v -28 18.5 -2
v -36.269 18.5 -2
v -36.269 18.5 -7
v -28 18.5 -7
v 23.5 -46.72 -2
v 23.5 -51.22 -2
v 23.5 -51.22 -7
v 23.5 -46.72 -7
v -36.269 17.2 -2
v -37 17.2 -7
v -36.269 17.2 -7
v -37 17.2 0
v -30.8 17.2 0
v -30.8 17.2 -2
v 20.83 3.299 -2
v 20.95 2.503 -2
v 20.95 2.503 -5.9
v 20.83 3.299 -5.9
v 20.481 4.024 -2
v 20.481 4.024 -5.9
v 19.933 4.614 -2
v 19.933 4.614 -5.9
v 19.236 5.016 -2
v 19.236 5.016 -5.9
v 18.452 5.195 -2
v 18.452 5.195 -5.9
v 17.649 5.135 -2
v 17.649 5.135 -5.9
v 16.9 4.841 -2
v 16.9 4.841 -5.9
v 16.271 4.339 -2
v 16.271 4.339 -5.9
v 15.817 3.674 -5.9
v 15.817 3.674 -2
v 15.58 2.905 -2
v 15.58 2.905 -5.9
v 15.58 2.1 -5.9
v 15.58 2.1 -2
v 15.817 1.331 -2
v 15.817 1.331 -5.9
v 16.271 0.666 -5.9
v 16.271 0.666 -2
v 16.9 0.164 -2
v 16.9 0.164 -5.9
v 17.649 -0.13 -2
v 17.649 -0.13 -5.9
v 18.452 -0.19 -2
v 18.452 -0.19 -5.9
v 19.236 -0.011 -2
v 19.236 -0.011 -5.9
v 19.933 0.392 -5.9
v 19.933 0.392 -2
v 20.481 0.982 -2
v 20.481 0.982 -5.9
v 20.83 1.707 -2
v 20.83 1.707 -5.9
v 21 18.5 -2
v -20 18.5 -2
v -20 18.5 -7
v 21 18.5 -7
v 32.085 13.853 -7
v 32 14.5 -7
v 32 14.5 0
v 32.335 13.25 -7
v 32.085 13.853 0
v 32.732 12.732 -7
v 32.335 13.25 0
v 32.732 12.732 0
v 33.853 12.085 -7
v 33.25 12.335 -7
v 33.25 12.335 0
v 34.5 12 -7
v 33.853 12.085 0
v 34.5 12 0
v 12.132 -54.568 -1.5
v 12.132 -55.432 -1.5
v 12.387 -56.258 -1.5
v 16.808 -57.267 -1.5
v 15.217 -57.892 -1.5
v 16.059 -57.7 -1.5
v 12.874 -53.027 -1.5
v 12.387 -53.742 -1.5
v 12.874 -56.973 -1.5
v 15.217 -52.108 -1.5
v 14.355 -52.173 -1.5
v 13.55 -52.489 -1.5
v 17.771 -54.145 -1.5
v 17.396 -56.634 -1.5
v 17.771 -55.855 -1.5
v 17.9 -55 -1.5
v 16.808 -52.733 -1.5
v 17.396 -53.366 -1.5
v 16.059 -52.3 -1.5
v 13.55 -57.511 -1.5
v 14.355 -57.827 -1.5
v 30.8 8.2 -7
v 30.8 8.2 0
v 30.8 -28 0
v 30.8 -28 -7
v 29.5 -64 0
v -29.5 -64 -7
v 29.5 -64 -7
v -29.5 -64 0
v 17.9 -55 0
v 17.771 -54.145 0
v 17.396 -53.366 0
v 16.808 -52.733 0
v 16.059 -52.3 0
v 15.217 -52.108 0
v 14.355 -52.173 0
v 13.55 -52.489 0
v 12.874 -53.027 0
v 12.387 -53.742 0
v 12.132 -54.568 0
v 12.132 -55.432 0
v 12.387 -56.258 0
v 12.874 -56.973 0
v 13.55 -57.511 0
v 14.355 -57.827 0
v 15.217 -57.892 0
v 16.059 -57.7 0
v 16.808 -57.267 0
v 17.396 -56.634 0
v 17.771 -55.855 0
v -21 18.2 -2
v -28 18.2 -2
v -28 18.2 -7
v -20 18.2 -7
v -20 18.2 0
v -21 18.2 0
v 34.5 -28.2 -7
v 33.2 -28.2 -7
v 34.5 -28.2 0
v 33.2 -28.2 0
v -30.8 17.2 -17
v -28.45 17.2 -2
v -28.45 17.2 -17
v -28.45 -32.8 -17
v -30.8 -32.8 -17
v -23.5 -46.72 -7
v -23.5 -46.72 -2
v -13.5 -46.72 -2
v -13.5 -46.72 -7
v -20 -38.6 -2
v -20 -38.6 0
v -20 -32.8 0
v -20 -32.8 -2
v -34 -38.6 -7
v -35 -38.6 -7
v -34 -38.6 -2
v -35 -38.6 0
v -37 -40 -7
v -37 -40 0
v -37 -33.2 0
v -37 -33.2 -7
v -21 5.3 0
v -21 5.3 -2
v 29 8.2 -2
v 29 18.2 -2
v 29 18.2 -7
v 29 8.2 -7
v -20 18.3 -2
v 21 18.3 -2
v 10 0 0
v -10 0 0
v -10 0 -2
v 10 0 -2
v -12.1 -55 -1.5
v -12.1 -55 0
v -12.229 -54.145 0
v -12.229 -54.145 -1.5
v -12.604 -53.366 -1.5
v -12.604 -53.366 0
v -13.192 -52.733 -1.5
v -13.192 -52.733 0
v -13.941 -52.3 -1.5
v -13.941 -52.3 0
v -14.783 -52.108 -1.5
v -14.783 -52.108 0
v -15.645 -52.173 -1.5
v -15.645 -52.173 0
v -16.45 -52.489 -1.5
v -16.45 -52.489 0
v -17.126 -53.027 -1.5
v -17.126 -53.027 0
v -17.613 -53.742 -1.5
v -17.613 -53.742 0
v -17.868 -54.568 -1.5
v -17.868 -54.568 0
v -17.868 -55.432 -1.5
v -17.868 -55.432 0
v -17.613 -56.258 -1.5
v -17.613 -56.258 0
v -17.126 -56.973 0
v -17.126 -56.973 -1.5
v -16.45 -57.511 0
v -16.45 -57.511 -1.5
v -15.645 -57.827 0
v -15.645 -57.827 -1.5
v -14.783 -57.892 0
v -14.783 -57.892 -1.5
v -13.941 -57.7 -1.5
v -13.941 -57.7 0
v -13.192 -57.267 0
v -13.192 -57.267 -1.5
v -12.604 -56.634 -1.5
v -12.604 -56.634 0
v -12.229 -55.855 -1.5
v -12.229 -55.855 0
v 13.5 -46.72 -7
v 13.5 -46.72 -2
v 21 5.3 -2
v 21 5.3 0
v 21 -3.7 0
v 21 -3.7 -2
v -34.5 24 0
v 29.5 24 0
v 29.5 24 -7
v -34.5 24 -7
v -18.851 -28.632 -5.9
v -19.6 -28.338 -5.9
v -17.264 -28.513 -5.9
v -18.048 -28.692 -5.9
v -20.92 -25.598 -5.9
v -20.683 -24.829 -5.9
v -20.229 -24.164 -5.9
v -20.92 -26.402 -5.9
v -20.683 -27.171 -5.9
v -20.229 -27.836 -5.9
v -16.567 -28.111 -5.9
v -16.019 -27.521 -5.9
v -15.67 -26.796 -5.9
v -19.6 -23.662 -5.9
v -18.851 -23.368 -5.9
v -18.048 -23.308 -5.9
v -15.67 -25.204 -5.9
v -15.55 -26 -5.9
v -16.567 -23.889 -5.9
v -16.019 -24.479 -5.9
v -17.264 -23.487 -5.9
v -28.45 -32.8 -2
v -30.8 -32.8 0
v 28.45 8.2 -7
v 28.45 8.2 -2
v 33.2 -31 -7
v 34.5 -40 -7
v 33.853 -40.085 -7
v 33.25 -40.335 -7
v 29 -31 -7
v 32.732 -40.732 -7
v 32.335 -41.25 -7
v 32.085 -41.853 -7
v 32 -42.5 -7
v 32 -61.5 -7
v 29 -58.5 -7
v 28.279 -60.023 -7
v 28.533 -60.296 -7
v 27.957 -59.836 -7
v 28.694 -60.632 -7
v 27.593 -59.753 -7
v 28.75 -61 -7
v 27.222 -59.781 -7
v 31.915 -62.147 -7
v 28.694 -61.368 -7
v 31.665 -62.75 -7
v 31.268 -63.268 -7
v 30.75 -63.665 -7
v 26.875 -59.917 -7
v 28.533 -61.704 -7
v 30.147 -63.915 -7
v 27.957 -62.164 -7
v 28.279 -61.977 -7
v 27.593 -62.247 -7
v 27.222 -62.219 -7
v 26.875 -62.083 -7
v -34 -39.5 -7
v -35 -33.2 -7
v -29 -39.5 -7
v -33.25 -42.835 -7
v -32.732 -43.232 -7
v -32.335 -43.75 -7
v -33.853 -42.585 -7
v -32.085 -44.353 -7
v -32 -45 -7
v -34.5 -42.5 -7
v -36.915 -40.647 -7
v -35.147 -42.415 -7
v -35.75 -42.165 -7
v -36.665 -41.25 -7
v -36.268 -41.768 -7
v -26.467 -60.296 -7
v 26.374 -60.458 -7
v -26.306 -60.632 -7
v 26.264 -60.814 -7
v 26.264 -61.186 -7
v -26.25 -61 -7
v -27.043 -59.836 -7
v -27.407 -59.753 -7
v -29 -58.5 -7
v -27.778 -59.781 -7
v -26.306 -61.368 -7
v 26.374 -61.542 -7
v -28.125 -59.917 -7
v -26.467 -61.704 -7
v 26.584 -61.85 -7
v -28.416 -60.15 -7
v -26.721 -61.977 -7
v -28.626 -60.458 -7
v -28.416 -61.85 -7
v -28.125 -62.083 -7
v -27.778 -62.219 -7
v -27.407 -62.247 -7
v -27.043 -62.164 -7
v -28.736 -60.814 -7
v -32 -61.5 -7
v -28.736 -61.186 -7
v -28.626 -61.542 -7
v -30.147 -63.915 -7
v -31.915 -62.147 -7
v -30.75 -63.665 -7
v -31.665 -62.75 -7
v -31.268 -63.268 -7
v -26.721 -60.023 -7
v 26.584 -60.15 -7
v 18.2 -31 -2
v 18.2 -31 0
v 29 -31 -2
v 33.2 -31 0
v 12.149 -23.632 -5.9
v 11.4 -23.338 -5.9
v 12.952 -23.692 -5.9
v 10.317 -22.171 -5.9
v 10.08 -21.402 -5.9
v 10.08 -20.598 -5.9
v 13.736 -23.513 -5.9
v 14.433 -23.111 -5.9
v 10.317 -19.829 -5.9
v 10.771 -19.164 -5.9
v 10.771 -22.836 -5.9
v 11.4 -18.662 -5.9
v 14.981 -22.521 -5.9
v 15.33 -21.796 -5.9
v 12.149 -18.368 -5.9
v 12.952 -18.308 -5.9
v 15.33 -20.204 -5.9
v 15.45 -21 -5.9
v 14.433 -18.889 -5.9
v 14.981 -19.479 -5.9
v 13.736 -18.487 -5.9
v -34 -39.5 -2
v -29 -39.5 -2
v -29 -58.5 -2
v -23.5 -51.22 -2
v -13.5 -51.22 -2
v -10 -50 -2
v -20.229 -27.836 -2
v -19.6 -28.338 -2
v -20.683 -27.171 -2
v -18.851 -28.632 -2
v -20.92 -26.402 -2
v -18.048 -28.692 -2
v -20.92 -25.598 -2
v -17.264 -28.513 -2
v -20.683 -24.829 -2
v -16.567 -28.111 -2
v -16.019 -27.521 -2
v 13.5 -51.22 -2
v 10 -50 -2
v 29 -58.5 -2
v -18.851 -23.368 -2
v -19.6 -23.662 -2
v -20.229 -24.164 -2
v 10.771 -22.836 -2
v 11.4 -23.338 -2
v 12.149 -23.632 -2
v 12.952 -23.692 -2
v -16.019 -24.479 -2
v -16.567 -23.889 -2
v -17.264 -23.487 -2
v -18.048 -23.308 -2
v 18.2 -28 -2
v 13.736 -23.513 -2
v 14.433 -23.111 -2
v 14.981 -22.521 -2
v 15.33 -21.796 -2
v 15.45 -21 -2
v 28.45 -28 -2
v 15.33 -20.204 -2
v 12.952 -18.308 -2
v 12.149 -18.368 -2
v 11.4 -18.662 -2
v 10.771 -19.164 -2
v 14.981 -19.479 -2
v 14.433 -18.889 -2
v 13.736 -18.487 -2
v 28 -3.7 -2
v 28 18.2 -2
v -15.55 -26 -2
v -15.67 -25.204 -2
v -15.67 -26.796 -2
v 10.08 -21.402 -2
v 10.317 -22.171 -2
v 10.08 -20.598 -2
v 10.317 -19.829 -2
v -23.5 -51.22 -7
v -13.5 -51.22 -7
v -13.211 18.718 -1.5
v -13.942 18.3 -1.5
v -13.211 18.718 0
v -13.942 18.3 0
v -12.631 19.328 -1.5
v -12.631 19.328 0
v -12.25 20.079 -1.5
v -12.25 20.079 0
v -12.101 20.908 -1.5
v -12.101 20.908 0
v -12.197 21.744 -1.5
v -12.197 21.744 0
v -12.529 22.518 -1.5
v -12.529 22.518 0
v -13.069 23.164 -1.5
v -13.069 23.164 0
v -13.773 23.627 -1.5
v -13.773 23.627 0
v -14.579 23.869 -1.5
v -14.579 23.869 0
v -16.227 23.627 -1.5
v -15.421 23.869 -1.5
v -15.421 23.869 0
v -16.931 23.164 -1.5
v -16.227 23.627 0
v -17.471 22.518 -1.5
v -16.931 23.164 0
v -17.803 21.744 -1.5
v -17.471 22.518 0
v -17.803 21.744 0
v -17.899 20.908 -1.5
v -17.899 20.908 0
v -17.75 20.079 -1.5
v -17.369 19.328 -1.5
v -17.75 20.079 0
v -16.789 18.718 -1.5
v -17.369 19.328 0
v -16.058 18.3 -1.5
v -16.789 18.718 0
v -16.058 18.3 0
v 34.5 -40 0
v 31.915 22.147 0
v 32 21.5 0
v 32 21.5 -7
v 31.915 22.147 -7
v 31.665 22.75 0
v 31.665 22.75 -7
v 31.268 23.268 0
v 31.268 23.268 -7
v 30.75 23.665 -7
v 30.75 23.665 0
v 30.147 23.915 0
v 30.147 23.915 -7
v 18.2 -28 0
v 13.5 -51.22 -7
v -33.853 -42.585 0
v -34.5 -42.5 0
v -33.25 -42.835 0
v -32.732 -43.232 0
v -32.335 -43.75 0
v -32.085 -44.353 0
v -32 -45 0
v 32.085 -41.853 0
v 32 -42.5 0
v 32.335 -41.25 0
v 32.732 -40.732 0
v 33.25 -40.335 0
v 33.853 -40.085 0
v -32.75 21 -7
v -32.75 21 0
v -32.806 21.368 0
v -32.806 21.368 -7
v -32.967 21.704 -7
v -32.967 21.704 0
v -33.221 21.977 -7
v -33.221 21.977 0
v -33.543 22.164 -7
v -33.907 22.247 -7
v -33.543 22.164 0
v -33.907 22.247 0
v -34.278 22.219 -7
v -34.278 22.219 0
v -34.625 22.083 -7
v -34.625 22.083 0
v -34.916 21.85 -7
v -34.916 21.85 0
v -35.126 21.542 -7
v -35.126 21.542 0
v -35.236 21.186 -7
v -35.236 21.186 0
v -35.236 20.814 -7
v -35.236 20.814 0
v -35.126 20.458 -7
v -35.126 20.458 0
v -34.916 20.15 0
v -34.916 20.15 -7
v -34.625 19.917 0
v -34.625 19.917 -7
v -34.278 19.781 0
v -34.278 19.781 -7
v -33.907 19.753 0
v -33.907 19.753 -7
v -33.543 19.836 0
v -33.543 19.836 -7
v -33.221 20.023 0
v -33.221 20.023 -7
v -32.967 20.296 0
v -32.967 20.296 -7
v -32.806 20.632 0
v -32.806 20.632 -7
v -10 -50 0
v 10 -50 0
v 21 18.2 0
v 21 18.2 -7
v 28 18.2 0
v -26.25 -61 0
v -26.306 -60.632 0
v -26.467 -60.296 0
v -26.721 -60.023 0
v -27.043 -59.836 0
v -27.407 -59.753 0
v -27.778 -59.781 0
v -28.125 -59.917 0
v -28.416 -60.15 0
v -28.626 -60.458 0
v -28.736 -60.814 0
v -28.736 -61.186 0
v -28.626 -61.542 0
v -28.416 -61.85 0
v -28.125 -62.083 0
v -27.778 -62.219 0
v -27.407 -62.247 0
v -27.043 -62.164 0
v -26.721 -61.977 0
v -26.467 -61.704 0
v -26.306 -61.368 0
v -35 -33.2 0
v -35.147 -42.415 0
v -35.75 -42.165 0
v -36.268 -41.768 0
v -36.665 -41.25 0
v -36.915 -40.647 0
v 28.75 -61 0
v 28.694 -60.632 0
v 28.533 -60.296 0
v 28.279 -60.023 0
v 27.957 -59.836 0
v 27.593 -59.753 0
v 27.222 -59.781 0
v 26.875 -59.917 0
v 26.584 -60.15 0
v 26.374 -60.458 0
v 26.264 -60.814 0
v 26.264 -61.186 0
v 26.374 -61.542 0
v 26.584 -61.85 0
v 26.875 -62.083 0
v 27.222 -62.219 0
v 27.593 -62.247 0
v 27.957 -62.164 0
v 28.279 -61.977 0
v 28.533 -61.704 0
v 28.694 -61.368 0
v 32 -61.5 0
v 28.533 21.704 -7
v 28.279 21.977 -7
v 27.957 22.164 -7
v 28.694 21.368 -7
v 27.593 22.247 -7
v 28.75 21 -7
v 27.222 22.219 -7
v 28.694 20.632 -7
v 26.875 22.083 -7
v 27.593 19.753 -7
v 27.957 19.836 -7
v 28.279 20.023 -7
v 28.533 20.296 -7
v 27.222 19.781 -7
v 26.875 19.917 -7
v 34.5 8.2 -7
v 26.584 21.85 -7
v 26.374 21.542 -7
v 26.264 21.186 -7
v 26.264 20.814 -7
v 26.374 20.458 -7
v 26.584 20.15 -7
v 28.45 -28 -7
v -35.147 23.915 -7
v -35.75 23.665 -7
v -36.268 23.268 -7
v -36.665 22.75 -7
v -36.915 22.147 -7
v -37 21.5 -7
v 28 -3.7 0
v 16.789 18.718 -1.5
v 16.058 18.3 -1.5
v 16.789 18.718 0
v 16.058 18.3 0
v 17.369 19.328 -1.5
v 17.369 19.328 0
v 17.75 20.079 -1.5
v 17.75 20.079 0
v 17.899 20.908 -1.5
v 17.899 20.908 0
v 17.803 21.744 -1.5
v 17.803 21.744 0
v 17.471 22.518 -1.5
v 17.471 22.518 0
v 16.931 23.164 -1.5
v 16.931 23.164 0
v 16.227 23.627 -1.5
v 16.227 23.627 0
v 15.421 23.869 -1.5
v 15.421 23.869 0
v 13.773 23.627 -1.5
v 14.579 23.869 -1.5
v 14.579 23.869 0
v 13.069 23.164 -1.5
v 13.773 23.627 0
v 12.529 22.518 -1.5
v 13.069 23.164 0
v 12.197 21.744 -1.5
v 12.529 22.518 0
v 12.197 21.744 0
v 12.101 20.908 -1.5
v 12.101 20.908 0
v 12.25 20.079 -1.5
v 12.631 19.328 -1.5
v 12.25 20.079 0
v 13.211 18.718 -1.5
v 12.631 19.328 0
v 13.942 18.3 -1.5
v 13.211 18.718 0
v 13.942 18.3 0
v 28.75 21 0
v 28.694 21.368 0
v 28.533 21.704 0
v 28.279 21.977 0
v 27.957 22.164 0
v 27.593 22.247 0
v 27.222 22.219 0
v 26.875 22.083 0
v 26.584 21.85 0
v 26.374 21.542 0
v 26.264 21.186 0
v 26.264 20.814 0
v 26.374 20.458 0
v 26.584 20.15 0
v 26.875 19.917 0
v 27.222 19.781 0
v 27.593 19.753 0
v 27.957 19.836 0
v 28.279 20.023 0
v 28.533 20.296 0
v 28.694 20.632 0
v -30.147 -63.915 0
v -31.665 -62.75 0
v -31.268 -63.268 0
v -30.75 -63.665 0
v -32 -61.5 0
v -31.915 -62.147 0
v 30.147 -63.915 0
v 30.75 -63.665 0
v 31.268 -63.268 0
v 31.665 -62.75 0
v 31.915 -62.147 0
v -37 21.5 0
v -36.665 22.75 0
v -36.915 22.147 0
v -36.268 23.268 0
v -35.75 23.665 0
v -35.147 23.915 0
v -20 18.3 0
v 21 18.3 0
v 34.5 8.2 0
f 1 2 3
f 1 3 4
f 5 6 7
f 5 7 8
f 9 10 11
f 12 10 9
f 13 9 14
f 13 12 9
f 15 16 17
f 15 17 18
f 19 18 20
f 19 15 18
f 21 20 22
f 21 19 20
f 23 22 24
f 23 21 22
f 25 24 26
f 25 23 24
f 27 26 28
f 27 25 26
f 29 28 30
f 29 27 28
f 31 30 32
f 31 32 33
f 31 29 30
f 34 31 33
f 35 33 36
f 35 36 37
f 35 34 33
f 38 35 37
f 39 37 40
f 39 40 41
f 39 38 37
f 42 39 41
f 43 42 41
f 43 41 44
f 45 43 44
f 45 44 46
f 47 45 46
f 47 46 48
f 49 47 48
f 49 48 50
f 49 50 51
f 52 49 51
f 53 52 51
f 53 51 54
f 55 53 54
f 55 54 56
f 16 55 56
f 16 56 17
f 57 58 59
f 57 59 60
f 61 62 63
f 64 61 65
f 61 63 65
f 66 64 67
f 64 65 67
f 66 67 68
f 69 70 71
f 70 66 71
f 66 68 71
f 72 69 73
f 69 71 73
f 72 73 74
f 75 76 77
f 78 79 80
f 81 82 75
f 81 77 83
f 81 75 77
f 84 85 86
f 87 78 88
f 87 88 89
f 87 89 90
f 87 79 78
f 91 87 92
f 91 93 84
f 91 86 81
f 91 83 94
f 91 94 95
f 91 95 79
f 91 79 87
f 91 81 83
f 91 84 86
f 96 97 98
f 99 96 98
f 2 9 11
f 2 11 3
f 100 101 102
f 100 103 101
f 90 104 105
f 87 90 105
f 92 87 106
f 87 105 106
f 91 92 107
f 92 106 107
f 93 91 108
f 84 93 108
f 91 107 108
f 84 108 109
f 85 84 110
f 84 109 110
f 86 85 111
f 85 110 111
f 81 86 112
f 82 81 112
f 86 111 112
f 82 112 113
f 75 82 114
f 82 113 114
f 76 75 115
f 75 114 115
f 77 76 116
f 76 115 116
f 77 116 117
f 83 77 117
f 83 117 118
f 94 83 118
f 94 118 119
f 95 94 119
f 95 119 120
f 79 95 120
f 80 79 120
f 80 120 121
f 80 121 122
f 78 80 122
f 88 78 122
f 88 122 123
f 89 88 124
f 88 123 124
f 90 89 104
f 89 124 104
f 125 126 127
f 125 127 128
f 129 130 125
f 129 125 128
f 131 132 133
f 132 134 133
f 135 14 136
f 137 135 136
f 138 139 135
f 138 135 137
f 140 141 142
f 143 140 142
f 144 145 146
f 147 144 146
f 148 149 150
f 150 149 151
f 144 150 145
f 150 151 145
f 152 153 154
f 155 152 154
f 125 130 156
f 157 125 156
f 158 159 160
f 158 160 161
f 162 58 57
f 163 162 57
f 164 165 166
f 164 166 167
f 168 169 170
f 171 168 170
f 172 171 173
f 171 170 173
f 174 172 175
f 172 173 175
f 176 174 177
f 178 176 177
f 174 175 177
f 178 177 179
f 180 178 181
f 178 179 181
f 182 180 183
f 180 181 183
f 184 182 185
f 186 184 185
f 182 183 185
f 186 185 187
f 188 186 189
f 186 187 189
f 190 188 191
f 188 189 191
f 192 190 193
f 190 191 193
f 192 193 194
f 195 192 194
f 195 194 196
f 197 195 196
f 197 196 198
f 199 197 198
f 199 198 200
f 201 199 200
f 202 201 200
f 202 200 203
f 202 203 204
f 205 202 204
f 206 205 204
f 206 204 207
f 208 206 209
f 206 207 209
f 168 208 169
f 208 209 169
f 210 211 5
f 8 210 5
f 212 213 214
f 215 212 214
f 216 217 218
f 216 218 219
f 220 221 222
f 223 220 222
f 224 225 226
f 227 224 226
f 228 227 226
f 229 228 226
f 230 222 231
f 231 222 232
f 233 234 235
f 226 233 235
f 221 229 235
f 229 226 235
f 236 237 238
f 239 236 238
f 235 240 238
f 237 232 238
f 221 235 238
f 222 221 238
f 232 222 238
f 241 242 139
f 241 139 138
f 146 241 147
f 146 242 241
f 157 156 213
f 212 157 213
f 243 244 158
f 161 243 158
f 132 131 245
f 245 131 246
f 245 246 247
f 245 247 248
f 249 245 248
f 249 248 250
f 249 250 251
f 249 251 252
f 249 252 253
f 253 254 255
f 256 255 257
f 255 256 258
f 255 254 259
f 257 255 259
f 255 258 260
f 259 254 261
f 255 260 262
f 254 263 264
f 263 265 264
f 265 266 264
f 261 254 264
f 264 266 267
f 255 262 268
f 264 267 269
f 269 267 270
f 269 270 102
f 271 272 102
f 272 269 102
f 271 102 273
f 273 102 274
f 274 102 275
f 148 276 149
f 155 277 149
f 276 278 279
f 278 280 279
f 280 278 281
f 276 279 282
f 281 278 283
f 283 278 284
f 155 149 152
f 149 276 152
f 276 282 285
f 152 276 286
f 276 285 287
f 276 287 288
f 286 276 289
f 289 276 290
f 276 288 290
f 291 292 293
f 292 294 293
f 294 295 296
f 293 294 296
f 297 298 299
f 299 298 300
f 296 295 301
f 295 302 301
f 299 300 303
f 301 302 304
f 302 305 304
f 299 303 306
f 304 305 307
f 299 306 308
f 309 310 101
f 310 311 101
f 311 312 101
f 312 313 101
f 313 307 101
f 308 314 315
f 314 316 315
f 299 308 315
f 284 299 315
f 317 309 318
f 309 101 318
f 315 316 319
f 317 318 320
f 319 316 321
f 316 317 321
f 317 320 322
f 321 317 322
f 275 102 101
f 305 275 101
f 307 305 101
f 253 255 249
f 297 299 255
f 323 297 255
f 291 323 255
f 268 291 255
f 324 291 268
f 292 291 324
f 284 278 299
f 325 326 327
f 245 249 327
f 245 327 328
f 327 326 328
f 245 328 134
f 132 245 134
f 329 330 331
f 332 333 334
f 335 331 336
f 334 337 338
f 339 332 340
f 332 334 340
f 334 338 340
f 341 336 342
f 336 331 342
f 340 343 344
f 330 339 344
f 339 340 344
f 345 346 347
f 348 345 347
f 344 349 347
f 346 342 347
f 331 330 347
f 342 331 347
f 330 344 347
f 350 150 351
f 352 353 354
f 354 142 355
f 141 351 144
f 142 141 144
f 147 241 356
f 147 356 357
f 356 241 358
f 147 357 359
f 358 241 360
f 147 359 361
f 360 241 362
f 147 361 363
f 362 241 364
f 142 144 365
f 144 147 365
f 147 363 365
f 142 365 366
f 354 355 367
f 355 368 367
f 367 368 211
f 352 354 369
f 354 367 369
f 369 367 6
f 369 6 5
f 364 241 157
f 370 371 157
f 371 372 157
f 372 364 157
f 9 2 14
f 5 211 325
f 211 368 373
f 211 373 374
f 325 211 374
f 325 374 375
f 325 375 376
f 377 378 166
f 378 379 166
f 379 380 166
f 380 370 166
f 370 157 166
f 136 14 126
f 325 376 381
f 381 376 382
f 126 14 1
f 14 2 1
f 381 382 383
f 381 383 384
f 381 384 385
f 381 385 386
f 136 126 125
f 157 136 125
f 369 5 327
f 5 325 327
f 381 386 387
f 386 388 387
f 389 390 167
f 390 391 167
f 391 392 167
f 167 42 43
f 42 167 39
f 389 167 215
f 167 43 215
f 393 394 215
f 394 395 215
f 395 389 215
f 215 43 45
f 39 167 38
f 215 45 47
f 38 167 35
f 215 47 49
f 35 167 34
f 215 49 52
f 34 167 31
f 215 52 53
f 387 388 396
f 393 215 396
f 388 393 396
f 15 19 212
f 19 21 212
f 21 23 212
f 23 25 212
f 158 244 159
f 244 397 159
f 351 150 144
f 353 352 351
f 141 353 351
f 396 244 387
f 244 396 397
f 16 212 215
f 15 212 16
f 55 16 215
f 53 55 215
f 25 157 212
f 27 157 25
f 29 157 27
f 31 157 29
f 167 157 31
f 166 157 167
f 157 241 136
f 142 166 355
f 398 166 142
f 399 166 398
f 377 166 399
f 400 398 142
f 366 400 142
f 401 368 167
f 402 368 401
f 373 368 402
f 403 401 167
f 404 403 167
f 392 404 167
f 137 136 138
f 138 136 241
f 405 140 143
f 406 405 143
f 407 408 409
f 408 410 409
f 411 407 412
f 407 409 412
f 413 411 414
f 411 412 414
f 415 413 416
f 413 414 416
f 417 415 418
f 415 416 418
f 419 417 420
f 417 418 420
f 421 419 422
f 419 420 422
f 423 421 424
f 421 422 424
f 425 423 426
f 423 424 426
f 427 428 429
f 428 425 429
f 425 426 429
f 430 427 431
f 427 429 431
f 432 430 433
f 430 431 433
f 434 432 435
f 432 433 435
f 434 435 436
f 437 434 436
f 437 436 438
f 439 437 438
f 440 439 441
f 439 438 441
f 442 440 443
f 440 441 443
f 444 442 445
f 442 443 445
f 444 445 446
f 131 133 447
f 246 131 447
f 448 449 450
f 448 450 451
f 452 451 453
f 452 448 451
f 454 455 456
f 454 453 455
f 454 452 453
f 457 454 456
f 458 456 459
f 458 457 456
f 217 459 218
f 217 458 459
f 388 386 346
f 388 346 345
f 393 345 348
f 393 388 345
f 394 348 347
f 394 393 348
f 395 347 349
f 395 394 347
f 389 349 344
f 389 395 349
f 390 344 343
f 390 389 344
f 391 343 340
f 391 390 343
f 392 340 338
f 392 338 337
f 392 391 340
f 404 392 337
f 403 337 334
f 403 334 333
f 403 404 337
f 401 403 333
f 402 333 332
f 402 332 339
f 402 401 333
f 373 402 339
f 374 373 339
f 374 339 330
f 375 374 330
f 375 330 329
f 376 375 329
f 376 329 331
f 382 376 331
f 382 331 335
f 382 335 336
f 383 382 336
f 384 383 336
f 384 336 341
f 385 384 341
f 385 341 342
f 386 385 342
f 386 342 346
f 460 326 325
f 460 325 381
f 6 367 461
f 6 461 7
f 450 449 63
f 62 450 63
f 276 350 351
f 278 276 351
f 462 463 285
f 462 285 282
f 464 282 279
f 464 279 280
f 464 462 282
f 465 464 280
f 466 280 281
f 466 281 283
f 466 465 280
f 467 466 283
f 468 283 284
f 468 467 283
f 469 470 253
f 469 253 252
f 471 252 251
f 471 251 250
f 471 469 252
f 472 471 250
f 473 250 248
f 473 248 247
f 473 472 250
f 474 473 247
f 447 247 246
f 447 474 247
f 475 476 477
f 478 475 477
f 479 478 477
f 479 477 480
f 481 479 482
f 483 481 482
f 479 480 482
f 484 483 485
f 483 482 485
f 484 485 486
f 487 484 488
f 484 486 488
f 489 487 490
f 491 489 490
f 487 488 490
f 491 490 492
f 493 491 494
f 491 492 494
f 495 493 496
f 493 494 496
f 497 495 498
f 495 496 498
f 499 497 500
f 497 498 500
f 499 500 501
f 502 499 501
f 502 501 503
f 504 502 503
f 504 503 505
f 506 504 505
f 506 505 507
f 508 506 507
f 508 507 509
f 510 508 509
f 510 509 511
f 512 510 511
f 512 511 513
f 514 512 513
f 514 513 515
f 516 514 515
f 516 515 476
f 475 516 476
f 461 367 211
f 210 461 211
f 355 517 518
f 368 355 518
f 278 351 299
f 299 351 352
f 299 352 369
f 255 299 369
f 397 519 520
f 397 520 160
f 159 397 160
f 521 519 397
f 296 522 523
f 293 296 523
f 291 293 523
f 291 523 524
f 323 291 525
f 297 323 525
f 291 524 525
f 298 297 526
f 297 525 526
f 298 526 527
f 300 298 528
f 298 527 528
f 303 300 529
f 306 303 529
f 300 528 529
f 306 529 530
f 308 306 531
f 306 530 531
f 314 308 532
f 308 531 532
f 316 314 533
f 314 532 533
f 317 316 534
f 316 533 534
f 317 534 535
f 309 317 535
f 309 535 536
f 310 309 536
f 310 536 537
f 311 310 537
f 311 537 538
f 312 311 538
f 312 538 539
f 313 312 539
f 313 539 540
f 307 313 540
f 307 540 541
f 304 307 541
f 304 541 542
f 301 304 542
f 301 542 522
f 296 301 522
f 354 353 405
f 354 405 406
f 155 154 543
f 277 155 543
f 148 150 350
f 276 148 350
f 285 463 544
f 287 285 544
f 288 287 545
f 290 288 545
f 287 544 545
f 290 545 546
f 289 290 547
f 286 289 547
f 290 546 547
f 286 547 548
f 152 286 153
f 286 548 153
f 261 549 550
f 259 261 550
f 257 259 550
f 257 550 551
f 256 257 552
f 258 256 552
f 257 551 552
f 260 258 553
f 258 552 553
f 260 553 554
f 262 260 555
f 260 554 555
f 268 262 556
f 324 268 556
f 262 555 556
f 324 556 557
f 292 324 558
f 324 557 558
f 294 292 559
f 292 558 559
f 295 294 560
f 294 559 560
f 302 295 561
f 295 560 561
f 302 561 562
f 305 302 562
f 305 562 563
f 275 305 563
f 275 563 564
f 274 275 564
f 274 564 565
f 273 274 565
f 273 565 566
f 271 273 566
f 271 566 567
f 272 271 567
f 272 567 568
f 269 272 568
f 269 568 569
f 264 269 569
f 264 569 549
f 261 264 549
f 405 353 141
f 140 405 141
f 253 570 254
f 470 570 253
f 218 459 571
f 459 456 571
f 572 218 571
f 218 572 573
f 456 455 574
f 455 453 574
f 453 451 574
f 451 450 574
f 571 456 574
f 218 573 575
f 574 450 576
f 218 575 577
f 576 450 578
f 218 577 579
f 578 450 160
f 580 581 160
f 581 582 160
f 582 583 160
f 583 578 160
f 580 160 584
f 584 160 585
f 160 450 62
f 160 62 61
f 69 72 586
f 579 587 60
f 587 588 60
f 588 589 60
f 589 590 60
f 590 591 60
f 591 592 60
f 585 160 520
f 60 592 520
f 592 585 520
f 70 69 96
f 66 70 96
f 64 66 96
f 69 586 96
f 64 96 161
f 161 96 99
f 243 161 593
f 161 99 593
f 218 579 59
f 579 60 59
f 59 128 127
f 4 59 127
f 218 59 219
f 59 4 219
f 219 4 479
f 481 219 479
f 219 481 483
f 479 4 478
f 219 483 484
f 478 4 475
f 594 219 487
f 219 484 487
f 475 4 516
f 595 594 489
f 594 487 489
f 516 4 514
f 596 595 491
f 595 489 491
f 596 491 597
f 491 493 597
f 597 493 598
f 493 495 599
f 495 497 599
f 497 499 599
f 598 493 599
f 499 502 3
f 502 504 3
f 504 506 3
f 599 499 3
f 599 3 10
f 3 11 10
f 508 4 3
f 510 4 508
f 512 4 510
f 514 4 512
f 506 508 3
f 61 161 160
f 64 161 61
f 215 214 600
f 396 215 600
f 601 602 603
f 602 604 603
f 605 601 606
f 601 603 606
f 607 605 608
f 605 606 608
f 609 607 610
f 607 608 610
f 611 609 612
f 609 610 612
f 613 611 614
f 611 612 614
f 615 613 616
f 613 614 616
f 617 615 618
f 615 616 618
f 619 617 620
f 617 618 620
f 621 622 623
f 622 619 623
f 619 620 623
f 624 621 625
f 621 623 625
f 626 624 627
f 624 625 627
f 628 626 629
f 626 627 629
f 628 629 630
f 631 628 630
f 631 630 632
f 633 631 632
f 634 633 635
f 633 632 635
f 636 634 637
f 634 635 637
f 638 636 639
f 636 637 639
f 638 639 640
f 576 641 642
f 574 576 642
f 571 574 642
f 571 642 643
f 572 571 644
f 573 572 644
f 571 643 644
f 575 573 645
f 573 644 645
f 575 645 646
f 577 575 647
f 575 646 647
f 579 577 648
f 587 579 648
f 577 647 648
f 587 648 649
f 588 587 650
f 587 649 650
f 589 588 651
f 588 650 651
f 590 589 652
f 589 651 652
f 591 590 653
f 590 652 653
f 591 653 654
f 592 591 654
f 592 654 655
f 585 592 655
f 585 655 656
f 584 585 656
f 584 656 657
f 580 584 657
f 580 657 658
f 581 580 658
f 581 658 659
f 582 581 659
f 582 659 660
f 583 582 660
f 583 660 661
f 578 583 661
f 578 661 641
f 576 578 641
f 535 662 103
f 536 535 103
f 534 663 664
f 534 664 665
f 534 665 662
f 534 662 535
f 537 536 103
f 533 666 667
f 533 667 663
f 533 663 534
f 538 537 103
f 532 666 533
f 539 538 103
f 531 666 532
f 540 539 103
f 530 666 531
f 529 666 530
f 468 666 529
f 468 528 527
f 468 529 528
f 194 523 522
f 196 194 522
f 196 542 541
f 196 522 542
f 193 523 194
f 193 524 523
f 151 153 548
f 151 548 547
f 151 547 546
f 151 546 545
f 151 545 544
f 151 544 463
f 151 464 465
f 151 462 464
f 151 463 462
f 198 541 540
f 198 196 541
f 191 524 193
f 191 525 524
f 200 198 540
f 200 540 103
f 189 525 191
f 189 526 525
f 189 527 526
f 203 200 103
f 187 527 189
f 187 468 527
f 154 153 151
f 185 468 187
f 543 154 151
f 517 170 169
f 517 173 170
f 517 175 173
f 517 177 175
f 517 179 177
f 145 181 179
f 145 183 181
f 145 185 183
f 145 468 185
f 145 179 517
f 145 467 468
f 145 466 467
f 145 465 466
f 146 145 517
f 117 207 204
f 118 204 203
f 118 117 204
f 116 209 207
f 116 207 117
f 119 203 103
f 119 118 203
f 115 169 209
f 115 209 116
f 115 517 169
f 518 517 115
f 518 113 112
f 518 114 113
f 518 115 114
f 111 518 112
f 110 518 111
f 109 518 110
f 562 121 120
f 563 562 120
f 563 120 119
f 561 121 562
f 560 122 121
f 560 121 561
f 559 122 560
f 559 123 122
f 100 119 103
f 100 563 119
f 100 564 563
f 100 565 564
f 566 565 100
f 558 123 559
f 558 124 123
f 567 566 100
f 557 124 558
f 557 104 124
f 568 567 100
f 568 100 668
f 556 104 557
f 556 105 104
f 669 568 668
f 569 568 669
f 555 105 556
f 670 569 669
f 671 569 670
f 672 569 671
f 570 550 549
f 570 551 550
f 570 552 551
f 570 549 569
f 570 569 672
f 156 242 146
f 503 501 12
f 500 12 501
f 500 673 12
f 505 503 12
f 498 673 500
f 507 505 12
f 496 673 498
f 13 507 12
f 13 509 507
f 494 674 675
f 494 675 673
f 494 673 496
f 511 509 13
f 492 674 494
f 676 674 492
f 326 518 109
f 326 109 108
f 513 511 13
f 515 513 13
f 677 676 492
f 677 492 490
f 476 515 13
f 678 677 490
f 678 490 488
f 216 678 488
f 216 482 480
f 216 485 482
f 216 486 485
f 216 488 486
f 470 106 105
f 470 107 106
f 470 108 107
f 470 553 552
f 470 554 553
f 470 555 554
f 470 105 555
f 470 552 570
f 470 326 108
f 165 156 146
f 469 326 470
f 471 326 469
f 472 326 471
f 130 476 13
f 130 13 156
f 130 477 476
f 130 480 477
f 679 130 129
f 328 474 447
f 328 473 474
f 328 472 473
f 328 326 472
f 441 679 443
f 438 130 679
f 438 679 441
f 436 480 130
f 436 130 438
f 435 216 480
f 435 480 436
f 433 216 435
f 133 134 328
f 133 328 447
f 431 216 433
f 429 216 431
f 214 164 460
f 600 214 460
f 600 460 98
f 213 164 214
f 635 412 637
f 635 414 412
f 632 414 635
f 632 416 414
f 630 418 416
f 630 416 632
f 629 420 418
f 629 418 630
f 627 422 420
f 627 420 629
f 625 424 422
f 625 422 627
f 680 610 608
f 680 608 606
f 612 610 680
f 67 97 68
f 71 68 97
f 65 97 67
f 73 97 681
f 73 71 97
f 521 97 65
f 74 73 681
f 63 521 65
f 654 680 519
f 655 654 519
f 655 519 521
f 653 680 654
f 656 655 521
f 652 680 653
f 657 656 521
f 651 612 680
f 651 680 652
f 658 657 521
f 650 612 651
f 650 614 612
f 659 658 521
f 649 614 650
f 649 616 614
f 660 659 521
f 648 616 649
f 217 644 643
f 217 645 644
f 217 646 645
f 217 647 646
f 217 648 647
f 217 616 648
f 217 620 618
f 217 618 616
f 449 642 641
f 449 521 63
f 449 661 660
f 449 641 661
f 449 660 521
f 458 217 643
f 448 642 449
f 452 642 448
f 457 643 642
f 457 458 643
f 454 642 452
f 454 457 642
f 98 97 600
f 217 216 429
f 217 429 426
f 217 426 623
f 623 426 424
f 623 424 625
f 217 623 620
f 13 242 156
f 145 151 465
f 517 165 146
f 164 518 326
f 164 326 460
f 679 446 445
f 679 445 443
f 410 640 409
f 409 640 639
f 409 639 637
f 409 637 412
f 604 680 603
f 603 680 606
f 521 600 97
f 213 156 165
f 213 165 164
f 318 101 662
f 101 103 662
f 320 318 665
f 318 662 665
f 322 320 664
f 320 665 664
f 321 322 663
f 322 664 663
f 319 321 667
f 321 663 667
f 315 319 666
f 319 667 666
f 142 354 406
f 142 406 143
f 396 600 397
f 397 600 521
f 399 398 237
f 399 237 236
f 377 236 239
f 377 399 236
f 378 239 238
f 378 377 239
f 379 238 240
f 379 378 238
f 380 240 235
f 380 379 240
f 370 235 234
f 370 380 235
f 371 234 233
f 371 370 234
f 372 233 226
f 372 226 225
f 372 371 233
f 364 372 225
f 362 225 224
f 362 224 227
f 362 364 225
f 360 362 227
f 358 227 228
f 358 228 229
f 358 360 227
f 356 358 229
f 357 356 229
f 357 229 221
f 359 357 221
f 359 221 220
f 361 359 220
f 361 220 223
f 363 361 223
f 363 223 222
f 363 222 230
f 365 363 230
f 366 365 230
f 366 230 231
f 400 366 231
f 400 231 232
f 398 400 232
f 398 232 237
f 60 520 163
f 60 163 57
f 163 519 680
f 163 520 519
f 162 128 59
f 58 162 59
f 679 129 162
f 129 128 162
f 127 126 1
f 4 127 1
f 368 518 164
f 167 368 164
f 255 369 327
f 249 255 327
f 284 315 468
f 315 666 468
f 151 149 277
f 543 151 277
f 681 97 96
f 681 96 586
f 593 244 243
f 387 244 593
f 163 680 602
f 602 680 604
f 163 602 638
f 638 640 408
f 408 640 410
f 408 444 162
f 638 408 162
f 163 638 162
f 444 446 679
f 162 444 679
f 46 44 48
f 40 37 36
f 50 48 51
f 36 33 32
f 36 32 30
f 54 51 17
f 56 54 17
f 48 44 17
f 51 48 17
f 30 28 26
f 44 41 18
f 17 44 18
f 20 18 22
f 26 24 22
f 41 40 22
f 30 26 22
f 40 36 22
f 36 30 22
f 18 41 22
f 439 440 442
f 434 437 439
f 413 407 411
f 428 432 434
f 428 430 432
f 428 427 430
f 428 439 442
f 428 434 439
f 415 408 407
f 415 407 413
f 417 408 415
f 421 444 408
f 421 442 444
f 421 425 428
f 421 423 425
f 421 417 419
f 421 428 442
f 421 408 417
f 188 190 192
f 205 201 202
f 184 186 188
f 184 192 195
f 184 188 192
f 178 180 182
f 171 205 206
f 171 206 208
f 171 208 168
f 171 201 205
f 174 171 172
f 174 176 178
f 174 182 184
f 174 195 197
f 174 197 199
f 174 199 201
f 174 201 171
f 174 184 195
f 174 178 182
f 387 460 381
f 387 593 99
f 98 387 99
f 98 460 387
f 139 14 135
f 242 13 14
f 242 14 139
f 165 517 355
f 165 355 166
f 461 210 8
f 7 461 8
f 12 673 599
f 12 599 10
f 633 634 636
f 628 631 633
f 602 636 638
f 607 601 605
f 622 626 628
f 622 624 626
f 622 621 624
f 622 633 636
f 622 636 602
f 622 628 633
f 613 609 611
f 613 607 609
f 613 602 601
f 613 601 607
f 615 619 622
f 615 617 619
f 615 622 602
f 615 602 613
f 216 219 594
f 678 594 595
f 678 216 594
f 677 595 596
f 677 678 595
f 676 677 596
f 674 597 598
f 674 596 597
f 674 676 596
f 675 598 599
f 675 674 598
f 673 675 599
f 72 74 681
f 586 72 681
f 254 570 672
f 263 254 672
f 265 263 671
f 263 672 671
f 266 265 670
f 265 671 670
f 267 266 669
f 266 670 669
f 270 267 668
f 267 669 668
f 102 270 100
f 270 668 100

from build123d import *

# Parameters (mm, degrees)
PAD005_DEPTH         = 2
POCKET003_DEPTH      = 2
SKETCH009_R          = 2.7
PAD004_DEPTH         = 5.9
SKETCH013_W          = 25
SKETCH013_H          = 50.4
SKETCH013_H_2        = 36.4
POCKET007_DEPTH      = 5.901
POCKET007_DEPTH_BACK = 0.001
SKETCH016_W          = 2.35
SKETCH016_H          = 50.4
PAD008_DEPTH         = 15
SKETCH017_W          = 2.35
SKETCH017_H          = 36.4
PAD009_DEPTH         = 5
SKETCH019_R          = 2.9
POCKET009_DEPTH      = 1.5
PAD011_DEPTH         = 5
SKETCH023_W          = 8
SKETCH023_H          = 4.5
SKETCH023_W_2        = 10
PAD013_DEPTH         = 7
SKETCH025_R          = 1.25
POCKET011_DEPTH      = 17.001
POCKET011_DEPTH_BACK = 0.001
SKETCH033_W          = 20
SKETCH033_H          = 50
POCKET017_DEPTH      = 17.001
POCKET017_DEPTH_BACK = 0.001
SKETCH042_W          = 15
SKETCH042_H          = 5.8
SKETCH042_H_2        = 3
POCKET021_DEPTH      = 17.001
POCKET021_DEPTH_BACK = 0.001


with BuildPart() as part:
    # Sketch011 → Pad005 (new body)
    with BuildSketch(Plane.XY):
        with BuildLine():
            Line((-29.5, -64), (29.5, -64))
            ThreePointArc((29.5, -64), (31.267767, -63.267767), (32, -61.5))
            Line((32, -42.5), (32, -61.5))
            ThreePointArc((34.5, -40), (32.732233, -40.732233), (32, -42.5))
            Line((34.5, 12), (34.5, -40))
            ThreePointArc((32, 14.5), (32.732233, 12.732233), (34.5, 12))
            Line((32, 21.5), (32, 14.5))
            ThreePointArc((32, 21.5), (31.267767, 23.267767), (29.5, 24))
            Line((29.5, 24), (-34.5, 24))
            ThreePointArc((-34.5, 24), (-36.267767, 23.267767), (-37, 21.5))
            Line((-37, 21.5), (-37, -40))
            ThreePointArc((-37, -40), (-36.267767, -41.767767), (-34.5, -42.5))
            ThreePointArc((-32, -45), (-32.732233, -43.232233), (-34.5, -42.5))
            Line((-32, -45), (-32, -61.5))
            ThreePointArc((-32, -61.5), (-31.267767, -63.267767), (-29.5, -64))
        make_face()
    extrude(amount=-PAD005_DEPTH)

    # Sketch007 → Pocket003 (cut)
    with BuildSketch(Plane.XY):
        Polygon((-21, 18.3), (-21, 5.3), (21, 5.3), (21, -3.7), (28, -3.7), (28, 18.3), align=None)
    extrude(amount=-POCKET003_DEPTH, mode=Mode.SUBTRACT)

    # Sketch009 → Pad004 (join)
    with BuildSketch(Plane.XY):
        with Locations((-18.25, -26)):
            Circle(SKETCH009_R)
        with Locations((12.75, -21)):
            Circle(SKETCH009_R)
        with Locations((18.25, 2.5027)):
            Circle(SKETCH009_R)
    extrude(amount=-PAD004_DEPTH)

    # Sketch013 → Pocket007 (cut, two sides)
    with BuildSketch(Plane.XY) as pocket007_sk:
        with Locations((-43.3, -8)):
            Rectangle(SKETCH013_W, SKETCH013_H)
        with Locations((43.3, -10)):
            Rectangle(SKETCH013_W, SKETCH013_H_2)
    extrude(amount=-POCKET007_DEPTH, mode=Mode.SUBTRACT)
    extrude(pocket007_sk.sketch, amount=POCKET007_DEPTH_BACK, mode=Mode.SUBTRACT)

    # Sketch016 (on Face5 of Pocket007) → Pad008 (join)
    with BuildSketch(Plane(origin=(0, 0, -2), x_dir=(1, 0, 0), z_dir=(0, 0, -1))):
        with Locations((-29.625, 8)):
            Rectangle(SKETCH016_W, SKETCH016_H)
    extrude(amount=PAD008_DEPTH)

    # Sketch017 (on Face5 of Pocket007) → Pad009 (join)
    with BuildSketch(Plane(origin=(0, 0, -2), x_dir=(1, 0, 0), z_dir=(0, 0, -1))):
        with Locations((29.625, 10)):
            Rectangle(SKETCH017_W, SKETCH017_H)
    extrude(amount=PAD009_DEPTH)

    # Sketch019 → Pocket009 (cut)
    with BuildSketch(Plane.XY):
        with Locations((-15, 21)):
            Circle(SKETCH019_R)
        with Locations((15, 21)):
            Circle(SKETCH019_R)
        with Locations((-15, -55)):
            Circle(SKETCH019_R)
        with Locations((15, -55)):
            Circle(SKETCH019_R)
    extrude(amount=-POCKET009_DEPTH, mode=Mode.SUBTRACT)

    # Sketch021 (on Face5 of Pocket009) → Pad011 (join)
    with BuildSketch(Plane(origin=(0, 0, -2), x_dir=(1, 0, 0), z_dir=(0, 0, -1))):
        with BuildLine():
            Line((-29.5, 64), (29.5, 64))
            ThreePointArc((32, 61.5), (31.267767, 63.267767), (29.5, 64))
            Line((32, 61.5), (32, 42.5))
            ThreePointArc((32, 42.5), (32.732233, 40.732233), (34.5, 40))
            Line((34.5, 28.2), (34.5, 40))
            Line((29, 28.2), (34.5, 28.2))
            Line((29, 58.5), (29, 28.2))
            Line((-29, 58.5), (29, 58.5))
            Line((-29, 39.5), (-29, 58.5))
            Line((-34, 39.5), (-29, 39.5))
            Line((-34, 33.2), (-34, 39.5))
            Line((-37, 33.2), (-34, 33.2))
            Line((-37, 40), (-37, 33.2))
            ThreePointArc((-34.5, 42.5), (-36.267767, 41.767767), (-37, 40))
            ThreePointArc((-34.5, 42.5), (-32.732233, 43.232233), (-32, 45))
            Line((-32, 61.5), (-32, 45))
            ThreePointArc((-29.5, 64), (-31.267767, 63.267767), (-32, 61.5))
        make_face()
        with BuildLine():
            Line((34.5, -8.2), (34.5, -12))
            ThreePointArc((34.5, -12), (32.732233, -12.732233), (32, -14.5))
            Line((32, -14.5), (32, -21.5))
            ThreePointArc((29.5, -24), (31.267767, -23.267767), (32, -21.5))
            Line((29.5, -24), (-34.5, -24))
            ThreePointArc((-37, -21.5), (-36.267767, -23.267767), (-34.5, -24))
            Line((-37, -21.5), (-37, -17.2))
            Line((-37, -17.2), (-36.26856, -17.2))
            Line((-36.26856, -17.2), (-36.26856, -18.5))
            Line((-36.26856, -18.5), (29, -18.5))
            Line((29, -18.5), (29, -8.2))
            Line((29, -8.2), (34.5, -8.2))
        make_face()
    extrude(amount=PAD011_DEPTH)

    # Sketch023 → Pad013 (join)
    with BuildSketch(Plane.XY):
        with Locations((-24, 20.45)):
            Rectangle(SKETCH023_W, SKETCH023_H)
        with Locations((25, 20.45)):
            Rectangle(SKETCH023_W, SKETCH023_H)
        with Locations((-18.5, -48.97)):
            Rectangle(SKETCH023_W_2, SKETCH023_H)
        with Locations((18.5, -48.97)):
            Rectangle(SKETCH023_W_2, SKETCH023_H)
    extrude(amount=-PAD013_DEPTH)

    # Sketch025 → Pocket011 (cut, two sides)
    with BuildSketch(Plane.XY) as pocket011_sk:
        with Locations((-34, 21)):
            Circle(SKETCH025_R)
        with Locations((27.5, 21)):
            Circle(SKETCH025_R)
        with Locations((27.5, -61)):
            Circle(SKETCH025_R)
        with Locations((-27.5, -61)):
            Circle(SKETCH025_R)
    extrude(amount=-POCKET011_DEPTH, mode=Mode.SUBTRACT)
    extrude(pocket011_sk.sketch, amount=POCKET011_DEPTH_BACK, mode=Mode.SUBTRACT)

    # Sketch033 → Pocket017 (cut, two sides)
    with BuildSketch(Plane.XY) as pocket017_sk:
        with Locations((0, -25)):
            Rectangle(SKETCH033_W, SKETCH033_H)
    extrude(amount=-POCKET017_DEPTH, mode=Mode.SUBTRACT)
    extrude(pocket017_sk.sketch, amount=POCKET017_DEPTH_BACK, mode=Mode.SUBTRACT)

    # Sketch042 → Pocket021 (cut, two sides)
    with BuildSketch(Plane.XY) as pocket021_sk:
        with Locations((-27.5, -35.7)):
            Rectangle(SKETCH042_W, SKETCH042_H)
        with Locations((25.7, -29.5)):
            Rectangle(SKETCH042_W, SKETCH042_H_2)
    extrude(amount=-POCKET021_DEPTH, mode=Mode.SUBTRACT)
    extrude(pocket021_sk.sketch, amount=POCKET021_DEPTH_BACK, mode=Mode.SUBTRACT)


solid = part.part
